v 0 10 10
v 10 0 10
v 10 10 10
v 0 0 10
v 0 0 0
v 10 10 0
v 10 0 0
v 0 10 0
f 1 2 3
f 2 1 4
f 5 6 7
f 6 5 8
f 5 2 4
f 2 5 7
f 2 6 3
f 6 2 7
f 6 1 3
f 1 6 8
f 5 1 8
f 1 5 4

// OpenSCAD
// Phase 7 smoke fixture for parameter/preset editing. Web clients cannot
// read .scad source through FileRead (server deny list), so parameter
// editing in web is driven by user-entered key=value overrides (defines),
// not by parsing this source. The file exists so PreviewRequest works.
size = 10;
wall = 2;
cube([size, size, size]);
